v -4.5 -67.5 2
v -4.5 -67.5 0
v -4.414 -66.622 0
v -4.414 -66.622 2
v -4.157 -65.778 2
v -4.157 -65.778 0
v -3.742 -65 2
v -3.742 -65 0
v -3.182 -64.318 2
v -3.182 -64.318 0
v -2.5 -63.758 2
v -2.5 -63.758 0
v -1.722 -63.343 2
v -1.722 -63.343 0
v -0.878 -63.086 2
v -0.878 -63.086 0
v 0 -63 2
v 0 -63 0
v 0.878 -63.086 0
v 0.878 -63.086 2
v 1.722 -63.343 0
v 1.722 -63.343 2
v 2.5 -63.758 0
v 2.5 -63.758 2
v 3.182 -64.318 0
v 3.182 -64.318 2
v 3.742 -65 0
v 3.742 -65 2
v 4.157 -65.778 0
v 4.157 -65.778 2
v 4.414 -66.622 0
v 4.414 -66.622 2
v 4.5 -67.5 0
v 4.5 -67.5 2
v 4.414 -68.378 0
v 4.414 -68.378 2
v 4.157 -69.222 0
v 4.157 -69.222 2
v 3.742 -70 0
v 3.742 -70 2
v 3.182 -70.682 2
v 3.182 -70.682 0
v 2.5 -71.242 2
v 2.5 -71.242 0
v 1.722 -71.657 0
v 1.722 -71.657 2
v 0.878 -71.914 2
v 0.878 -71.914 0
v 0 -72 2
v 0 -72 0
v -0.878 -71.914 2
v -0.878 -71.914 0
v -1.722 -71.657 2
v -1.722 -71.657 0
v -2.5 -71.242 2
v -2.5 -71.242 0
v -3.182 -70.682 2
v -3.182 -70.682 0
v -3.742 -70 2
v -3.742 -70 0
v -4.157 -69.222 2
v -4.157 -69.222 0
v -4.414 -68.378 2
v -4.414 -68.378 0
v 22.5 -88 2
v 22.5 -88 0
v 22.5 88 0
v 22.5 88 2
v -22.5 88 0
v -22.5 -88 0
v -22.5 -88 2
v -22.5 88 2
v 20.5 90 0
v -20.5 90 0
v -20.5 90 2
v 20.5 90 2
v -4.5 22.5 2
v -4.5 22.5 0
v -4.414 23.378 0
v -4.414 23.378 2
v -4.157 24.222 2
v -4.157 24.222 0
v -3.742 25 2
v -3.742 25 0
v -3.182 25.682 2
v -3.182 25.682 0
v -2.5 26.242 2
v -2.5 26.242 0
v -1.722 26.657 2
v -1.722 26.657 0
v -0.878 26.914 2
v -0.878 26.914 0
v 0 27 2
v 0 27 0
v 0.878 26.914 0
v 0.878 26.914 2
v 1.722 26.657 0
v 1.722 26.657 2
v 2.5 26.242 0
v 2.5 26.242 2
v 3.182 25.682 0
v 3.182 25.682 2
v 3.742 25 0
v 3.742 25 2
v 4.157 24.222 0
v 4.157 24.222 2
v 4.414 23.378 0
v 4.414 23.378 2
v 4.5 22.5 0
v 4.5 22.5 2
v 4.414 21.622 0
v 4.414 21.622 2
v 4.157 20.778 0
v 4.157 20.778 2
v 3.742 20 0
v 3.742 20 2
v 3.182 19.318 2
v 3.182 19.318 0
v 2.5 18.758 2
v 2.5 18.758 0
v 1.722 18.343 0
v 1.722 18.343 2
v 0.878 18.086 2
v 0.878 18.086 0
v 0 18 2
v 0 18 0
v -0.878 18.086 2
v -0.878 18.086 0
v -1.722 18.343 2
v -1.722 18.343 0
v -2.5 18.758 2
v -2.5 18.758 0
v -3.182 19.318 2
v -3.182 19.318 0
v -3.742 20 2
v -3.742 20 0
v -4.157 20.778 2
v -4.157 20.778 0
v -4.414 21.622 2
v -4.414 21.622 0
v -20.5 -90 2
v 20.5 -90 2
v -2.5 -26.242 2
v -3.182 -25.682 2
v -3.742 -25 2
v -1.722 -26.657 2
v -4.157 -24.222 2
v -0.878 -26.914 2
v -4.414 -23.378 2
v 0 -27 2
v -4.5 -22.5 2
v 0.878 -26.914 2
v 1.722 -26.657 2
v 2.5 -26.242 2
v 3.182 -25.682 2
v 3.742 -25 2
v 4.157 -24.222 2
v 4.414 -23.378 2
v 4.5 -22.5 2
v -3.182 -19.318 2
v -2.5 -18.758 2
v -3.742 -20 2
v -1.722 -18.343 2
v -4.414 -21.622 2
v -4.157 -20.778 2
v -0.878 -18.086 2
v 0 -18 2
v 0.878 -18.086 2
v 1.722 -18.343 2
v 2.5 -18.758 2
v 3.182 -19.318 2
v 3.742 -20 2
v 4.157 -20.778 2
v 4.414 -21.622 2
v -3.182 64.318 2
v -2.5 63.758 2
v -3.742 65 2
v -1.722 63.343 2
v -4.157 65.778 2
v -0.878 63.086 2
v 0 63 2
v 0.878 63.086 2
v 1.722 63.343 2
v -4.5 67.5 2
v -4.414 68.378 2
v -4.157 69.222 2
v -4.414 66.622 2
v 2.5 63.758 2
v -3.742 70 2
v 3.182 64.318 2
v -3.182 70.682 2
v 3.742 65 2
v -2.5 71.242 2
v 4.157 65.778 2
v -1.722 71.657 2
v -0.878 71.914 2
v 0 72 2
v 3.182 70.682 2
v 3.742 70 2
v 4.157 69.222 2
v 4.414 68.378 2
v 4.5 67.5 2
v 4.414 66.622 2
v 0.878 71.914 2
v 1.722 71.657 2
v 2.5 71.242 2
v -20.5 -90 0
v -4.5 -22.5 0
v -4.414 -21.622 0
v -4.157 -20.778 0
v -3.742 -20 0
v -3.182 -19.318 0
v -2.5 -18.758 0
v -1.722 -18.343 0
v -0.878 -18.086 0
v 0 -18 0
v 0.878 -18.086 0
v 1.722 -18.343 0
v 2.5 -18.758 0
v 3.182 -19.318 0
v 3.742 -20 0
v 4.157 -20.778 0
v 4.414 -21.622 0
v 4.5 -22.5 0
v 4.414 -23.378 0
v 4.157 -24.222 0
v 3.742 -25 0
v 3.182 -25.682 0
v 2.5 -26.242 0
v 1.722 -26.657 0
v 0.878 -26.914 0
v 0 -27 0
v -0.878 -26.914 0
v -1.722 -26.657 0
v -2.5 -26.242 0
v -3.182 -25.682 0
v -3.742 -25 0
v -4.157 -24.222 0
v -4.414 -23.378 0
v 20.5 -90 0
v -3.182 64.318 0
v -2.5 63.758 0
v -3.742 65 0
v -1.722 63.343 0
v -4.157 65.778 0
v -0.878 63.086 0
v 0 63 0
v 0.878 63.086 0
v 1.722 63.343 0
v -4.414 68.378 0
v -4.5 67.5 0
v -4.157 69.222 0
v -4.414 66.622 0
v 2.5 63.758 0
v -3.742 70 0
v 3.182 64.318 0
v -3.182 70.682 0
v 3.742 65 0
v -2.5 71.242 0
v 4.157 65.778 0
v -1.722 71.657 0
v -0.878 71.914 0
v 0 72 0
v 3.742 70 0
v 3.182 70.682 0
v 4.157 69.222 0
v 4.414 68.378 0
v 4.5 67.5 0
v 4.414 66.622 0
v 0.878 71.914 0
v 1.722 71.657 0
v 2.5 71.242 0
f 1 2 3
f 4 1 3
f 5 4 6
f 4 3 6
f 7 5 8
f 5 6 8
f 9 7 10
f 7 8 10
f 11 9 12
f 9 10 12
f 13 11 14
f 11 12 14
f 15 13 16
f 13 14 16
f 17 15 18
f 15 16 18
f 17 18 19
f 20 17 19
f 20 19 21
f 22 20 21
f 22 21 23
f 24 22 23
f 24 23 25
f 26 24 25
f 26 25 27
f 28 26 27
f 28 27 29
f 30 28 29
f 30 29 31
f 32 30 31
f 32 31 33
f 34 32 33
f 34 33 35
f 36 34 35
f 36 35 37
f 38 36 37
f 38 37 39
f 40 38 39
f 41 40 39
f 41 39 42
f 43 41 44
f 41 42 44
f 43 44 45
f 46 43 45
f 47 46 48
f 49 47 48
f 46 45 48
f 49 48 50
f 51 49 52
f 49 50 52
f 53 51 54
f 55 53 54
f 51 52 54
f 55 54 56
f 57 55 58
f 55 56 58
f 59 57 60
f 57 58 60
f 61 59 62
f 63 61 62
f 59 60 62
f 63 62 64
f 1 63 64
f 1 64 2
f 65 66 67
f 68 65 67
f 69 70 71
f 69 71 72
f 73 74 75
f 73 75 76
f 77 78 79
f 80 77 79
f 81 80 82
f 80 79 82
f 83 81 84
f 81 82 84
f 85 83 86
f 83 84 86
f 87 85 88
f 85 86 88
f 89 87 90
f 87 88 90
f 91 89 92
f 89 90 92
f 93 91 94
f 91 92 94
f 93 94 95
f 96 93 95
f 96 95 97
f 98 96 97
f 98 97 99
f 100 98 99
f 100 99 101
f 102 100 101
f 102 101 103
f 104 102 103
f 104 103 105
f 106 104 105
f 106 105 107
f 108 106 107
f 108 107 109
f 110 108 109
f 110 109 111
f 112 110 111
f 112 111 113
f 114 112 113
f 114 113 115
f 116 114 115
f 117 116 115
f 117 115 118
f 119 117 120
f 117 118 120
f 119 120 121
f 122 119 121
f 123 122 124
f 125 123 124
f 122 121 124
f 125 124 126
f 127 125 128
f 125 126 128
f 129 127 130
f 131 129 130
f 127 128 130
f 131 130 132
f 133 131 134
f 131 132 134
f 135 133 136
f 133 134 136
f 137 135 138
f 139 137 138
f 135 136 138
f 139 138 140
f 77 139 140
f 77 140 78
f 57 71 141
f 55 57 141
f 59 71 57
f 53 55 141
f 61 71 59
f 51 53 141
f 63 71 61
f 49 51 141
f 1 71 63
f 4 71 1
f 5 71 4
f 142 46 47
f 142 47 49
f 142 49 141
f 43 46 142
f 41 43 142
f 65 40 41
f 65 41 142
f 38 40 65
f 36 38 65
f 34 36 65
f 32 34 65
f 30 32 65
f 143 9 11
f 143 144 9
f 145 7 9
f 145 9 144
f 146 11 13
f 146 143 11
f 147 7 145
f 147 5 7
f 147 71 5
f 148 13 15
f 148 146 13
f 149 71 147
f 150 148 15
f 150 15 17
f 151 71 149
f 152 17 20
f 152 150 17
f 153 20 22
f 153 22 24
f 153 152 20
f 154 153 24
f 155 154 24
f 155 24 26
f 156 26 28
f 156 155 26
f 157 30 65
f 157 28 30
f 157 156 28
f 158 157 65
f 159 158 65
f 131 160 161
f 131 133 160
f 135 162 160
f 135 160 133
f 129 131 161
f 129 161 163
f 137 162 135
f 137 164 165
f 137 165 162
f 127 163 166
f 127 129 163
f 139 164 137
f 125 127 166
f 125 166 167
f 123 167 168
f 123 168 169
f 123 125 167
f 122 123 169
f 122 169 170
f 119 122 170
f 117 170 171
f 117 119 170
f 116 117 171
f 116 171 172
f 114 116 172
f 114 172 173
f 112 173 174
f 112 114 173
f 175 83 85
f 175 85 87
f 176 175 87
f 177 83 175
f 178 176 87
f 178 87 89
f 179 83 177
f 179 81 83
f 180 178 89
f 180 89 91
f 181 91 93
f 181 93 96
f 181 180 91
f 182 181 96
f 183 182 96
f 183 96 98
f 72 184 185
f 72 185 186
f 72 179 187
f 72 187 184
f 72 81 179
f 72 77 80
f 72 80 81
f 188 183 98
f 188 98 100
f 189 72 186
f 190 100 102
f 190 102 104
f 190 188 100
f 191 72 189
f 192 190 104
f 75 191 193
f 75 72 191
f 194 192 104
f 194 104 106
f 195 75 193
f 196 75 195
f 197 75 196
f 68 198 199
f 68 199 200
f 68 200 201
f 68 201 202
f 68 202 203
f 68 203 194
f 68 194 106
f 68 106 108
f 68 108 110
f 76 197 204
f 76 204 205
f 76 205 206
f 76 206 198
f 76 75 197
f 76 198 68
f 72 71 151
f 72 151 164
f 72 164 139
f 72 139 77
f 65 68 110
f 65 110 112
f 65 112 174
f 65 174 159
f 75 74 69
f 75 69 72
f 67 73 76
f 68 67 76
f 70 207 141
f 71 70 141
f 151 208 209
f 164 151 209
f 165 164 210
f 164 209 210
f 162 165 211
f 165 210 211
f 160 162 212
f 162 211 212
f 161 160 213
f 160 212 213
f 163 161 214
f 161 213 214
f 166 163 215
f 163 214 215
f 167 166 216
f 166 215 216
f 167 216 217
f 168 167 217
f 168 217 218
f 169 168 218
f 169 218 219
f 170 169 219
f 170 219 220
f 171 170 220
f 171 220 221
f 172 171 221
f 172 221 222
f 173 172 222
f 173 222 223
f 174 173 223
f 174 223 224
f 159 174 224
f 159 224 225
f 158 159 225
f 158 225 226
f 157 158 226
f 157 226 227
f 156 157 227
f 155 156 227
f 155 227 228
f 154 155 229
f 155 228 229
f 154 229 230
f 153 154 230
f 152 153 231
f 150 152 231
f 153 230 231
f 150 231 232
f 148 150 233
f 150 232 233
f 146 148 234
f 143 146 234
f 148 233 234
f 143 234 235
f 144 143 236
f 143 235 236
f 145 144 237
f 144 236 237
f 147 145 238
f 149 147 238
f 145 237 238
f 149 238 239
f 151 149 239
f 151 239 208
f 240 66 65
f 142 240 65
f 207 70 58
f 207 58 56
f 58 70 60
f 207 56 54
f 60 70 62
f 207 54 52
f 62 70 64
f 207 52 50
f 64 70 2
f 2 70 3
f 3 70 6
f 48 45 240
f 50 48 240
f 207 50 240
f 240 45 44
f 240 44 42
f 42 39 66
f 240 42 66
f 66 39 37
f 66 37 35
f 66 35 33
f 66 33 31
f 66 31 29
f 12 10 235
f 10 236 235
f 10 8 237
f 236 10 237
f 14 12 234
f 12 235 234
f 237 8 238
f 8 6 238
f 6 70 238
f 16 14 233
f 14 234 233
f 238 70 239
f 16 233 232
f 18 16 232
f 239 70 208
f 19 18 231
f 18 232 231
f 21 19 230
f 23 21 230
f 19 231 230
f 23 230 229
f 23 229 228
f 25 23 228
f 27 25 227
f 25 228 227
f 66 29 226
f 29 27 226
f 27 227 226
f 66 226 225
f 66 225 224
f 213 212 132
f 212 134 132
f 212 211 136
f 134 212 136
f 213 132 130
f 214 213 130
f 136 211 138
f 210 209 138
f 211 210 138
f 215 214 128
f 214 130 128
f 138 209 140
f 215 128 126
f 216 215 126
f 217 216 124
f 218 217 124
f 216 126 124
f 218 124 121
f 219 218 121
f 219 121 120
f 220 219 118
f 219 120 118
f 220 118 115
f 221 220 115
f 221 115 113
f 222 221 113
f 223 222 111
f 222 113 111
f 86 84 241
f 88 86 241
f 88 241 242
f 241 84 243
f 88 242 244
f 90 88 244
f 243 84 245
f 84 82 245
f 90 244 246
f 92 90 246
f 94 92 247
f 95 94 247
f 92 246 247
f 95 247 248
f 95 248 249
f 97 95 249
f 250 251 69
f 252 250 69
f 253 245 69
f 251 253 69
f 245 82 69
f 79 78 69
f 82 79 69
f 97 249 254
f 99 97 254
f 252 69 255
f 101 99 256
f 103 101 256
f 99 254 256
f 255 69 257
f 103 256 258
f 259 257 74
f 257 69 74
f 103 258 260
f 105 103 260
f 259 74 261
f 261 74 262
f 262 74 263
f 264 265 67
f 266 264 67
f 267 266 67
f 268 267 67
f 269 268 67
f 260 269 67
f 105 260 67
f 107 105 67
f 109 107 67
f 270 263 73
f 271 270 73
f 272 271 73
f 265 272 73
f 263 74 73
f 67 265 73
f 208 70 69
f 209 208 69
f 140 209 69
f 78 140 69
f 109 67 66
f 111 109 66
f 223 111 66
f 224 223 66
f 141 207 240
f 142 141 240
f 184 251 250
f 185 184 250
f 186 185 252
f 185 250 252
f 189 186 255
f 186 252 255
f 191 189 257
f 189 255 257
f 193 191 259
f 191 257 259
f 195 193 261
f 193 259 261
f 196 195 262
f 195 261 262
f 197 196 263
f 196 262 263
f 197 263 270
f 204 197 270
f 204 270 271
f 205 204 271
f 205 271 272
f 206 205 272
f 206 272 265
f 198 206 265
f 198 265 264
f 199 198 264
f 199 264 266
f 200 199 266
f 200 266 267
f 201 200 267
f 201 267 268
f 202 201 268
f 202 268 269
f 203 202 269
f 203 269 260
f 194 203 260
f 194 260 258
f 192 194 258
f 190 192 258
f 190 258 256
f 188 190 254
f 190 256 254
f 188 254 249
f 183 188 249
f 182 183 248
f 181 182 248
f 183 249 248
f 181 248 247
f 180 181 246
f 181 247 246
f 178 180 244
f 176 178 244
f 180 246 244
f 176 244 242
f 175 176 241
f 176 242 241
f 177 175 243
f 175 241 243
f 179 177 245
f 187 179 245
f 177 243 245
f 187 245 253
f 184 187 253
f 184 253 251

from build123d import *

# Parameters (mm, degrees)
SKETCH_1_W        = 45
SKETCH_1_H        = 180
EXTRUDE_1_DEPTH   = 2
CHAMFER_1_SIZE    = 2
HOLE_WIZARD_M81_D = 9


with BuildPart() as part:
    # Эскиз1 → Бобышка-Вытянуть1 (new body)
    with BuildSketch(Plane.XY):
        Rectangle(SKETCH_1_W, SKETCH_1_H)
    extrude(amount=EXTRUDE_1_DEPTH)

    # Фаска1
    chamfer_1_edges = [part.edges().sort_by_distance(p)[0] for p in [
        (22.5, -90, 1),
        (-22.5, -90, 1),
        (-22.5, 90, 1),
        (22.5, 90, 1),
    ]]
    chamfer(chamfer_1_edges, length=CHAMFER_1_SIZE)

    # Отверстие с зазором M81 (through all)
    with Locations(Plane.XY.offset(2)):
        with Locations((0, 67.5), (0, 22.5), (0, -22.5), (0, -67.5)):
            Hole(HOLE_WIZARD_M81_D / 2)


solid = part.part
